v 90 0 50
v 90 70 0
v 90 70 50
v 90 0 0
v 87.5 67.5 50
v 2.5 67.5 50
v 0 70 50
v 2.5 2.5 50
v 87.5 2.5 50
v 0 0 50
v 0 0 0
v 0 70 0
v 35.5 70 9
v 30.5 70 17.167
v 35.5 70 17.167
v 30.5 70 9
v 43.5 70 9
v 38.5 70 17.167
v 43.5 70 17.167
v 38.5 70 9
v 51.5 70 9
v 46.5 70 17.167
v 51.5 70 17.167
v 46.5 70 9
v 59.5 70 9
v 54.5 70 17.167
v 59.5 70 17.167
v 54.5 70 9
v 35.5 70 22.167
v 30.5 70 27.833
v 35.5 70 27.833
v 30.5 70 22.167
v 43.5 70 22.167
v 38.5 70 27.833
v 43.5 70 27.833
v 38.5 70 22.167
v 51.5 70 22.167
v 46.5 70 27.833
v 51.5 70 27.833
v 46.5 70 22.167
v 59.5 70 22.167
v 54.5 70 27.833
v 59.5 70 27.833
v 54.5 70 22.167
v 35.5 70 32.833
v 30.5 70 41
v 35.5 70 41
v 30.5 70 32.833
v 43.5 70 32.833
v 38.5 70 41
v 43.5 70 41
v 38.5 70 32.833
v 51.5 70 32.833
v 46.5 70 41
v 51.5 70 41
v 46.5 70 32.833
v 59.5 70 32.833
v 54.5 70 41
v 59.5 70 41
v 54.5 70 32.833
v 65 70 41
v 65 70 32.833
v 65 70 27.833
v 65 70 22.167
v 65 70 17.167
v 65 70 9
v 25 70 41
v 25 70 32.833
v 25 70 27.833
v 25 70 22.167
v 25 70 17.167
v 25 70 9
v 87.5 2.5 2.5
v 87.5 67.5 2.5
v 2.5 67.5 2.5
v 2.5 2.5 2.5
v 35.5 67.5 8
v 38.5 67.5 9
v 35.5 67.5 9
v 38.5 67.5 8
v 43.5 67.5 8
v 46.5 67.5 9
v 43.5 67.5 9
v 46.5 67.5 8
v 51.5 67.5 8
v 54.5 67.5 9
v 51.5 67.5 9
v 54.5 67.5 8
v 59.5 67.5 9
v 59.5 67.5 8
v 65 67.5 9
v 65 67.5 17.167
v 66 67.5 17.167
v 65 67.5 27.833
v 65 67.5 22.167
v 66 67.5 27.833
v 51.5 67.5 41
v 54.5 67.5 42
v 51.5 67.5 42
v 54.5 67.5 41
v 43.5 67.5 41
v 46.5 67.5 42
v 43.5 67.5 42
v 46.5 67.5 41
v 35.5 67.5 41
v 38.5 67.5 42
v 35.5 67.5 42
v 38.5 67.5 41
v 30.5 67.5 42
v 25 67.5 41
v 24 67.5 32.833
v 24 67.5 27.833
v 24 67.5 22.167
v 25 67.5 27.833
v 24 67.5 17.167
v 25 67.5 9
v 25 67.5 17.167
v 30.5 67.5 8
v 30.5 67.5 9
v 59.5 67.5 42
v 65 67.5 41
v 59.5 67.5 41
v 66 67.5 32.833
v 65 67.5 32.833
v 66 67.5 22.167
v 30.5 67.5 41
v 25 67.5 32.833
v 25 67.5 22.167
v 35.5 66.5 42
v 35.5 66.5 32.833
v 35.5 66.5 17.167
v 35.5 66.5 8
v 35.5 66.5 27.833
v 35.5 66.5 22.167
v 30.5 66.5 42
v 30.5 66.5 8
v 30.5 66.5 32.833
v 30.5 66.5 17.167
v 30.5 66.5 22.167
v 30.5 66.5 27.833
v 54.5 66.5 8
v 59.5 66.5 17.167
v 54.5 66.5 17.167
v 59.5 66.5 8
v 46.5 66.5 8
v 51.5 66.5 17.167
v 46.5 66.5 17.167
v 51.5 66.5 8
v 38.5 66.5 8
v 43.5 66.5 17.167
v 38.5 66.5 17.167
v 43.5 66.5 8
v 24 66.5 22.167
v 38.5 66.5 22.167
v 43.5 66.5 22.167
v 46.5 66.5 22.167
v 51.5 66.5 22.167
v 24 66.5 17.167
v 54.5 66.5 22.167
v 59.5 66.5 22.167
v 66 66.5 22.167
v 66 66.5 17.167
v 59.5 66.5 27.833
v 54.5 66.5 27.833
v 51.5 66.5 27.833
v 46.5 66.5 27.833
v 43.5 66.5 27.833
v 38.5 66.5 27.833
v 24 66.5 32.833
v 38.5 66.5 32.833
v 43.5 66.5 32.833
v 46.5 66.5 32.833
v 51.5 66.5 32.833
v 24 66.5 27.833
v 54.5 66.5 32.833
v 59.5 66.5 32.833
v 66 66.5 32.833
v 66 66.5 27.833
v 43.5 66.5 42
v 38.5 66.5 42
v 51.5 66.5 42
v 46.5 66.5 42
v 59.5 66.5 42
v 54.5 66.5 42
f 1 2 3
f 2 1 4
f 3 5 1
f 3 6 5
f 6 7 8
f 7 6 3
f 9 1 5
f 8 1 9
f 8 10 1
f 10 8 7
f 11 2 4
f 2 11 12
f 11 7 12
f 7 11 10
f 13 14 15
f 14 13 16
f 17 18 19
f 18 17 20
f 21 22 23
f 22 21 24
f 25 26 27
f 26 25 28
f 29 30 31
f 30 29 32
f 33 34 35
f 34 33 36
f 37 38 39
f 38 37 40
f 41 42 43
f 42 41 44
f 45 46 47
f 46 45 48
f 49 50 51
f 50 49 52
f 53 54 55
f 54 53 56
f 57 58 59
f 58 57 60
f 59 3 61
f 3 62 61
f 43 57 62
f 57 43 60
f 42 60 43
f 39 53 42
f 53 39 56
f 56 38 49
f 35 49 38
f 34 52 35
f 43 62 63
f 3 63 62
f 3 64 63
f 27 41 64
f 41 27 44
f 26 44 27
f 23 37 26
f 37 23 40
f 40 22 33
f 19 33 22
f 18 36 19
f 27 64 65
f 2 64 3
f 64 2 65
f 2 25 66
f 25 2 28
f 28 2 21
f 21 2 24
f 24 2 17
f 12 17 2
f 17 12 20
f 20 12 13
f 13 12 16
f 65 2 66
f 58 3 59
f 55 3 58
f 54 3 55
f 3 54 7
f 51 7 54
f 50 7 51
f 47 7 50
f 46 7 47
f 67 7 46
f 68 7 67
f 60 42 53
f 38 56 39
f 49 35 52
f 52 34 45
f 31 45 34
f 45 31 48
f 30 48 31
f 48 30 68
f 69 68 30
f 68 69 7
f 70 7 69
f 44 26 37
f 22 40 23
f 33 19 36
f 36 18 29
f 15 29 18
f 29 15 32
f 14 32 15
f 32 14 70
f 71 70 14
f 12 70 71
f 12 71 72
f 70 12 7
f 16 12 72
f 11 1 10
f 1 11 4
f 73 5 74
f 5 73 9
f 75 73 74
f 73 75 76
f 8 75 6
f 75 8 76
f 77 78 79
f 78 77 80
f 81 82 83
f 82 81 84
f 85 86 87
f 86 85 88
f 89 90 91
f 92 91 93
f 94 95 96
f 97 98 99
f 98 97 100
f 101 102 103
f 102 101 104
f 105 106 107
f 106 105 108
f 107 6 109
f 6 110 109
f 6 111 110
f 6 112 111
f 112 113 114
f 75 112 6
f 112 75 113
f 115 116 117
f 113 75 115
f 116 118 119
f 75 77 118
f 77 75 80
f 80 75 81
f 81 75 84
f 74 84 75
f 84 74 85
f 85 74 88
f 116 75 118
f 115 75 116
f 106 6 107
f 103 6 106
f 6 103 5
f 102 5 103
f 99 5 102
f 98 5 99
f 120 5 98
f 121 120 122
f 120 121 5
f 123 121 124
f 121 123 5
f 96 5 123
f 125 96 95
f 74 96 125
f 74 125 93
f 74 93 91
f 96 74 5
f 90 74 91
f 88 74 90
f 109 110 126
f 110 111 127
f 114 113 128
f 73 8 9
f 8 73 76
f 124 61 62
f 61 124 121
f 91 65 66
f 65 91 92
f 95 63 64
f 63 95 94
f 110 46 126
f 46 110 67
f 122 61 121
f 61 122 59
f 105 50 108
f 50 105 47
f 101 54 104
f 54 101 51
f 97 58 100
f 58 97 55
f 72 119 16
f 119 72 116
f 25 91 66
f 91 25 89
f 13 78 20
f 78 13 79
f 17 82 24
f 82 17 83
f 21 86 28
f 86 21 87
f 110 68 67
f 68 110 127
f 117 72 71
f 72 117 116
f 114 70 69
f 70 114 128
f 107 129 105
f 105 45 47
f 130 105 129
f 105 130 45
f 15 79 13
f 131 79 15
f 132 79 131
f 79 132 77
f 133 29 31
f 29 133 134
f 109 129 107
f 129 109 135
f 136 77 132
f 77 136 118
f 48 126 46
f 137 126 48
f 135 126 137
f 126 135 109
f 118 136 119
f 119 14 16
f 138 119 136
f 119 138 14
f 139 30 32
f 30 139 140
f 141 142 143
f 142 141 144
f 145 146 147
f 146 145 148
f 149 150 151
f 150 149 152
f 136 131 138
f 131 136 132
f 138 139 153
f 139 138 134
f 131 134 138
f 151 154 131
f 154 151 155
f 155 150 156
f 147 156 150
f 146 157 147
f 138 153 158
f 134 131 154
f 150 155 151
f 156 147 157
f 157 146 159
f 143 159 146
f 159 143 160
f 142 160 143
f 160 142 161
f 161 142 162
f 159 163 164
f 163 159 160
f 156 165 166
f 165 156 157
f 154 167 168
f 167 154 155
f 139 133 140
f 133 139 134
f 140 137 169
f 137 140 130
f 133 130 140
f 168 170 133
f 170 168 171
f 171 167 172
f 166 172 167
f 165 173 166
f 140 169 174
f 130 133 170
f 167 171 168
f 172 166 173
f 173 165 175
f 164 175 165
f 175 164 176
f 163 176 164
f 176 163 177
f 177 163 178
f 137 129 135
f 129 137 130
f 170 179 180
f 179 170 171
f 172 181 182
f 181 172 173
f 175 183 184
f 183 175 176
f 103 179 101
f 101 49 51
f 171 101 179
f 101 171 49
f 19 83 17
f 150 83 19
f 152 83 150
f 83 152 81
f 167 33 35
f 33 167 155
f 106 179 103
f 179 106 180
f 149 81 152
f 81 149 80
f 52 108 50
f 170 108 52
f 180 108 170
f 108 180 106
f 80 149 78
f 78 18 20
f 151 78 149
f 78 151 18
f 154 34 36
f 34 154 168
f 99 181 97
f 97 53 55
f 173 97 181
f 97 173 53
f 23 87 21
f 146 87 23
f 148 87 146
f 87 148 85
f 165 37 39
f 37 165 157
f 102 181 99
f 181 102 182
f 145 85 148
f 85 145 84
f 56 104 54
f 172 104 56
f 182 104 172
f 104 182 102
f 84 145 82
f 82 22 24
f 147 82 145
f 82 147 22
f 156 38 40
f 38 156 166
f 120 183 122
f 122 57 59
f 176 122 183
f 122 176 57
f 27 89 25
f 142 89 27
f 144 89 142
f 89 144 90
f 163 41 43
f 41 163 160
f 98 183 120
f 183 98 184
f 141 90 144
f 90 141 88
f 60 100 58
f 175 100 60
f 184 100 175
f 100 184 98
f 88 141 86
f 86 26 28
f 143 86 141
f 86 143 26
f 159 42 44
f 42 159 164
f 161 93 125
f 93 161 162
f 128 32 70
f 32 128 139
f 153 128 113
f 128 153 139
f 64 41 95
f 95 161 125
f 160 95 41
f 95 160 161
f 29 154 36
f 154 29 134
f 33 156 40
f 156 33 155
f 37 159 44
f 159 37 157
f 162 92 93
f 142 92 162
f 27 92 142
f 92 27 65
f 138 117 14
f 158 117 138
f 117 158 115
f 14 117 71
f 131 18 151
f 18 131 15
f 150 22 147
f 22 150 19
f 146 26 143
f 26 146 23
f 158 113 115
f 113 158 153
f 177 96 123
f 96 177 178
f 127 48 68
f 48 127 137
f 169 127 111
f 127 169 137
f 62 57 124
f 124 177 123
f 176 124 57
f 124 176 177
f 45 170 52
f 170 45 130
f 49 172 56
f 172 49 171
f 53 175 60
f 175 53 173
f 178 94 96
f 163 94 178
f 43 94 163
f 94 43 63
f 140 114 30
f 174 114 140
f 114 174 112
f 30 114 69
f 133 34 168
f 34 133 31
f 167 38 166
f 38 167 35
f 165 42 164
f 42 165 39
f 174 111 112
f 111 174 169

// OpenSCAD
$fn = 32;

// ----------------------------------------------------------------------
// Vent box: crossgrid enclosure
// ----------------------------------------------------------------------

// --- parameters (mm) ---
box_l = 90;               // box length, X
box_w = 70;               // box width, Y
box_h = 50;               // box height, Z
wall_t = 2.5;             // shell wall thickness
win_l = 40;               // vent window width, X
win_h = 32;               // vent window height, Z
bar_w = 5;                // grid bar width
n_v = 4;                  // vertical bar count
n_h = 2;                  // horizontal bar count

win_z0 = (box_h - win_h) / 2;  // window lower edge Z
v_step = win_l / (n_v + 1);  // vertical bar step
h_step = win_h / (n_h + 1);  // horizontal bar step

difference() {
  union() {
    difference() {
      cube([box_l, box_w, box_h]);
  translate([wall_t, wall_t, wall_t])
    cube([box_l - 2 * wall_t, box_w - 2 * wall_t, box_h]);
  translate([(box_l - win_l) / 2, box_w - wall_t - 1, win_z0])
    cube([win_l, wall_t + 2, win_h]);
    }
    for (i = [1 : n_v])
      translate([(box_l - win_l) / 2 + i * v_step - bar_w / 2,
                 box_w - wall_t - 1, win_z0 - 1])
        cube([bar_w, wall_t + 1, win_h + 2]);
    for (i = [1 : n_h])
      translate([(box_l - win_l) / 2 - 1, box_w - wall_t - 1,
                 win_z0 + i * h_step - bar_w / 2])
        cube([win_l + 2, wall_t + 1, bar_w]);
  }
}
